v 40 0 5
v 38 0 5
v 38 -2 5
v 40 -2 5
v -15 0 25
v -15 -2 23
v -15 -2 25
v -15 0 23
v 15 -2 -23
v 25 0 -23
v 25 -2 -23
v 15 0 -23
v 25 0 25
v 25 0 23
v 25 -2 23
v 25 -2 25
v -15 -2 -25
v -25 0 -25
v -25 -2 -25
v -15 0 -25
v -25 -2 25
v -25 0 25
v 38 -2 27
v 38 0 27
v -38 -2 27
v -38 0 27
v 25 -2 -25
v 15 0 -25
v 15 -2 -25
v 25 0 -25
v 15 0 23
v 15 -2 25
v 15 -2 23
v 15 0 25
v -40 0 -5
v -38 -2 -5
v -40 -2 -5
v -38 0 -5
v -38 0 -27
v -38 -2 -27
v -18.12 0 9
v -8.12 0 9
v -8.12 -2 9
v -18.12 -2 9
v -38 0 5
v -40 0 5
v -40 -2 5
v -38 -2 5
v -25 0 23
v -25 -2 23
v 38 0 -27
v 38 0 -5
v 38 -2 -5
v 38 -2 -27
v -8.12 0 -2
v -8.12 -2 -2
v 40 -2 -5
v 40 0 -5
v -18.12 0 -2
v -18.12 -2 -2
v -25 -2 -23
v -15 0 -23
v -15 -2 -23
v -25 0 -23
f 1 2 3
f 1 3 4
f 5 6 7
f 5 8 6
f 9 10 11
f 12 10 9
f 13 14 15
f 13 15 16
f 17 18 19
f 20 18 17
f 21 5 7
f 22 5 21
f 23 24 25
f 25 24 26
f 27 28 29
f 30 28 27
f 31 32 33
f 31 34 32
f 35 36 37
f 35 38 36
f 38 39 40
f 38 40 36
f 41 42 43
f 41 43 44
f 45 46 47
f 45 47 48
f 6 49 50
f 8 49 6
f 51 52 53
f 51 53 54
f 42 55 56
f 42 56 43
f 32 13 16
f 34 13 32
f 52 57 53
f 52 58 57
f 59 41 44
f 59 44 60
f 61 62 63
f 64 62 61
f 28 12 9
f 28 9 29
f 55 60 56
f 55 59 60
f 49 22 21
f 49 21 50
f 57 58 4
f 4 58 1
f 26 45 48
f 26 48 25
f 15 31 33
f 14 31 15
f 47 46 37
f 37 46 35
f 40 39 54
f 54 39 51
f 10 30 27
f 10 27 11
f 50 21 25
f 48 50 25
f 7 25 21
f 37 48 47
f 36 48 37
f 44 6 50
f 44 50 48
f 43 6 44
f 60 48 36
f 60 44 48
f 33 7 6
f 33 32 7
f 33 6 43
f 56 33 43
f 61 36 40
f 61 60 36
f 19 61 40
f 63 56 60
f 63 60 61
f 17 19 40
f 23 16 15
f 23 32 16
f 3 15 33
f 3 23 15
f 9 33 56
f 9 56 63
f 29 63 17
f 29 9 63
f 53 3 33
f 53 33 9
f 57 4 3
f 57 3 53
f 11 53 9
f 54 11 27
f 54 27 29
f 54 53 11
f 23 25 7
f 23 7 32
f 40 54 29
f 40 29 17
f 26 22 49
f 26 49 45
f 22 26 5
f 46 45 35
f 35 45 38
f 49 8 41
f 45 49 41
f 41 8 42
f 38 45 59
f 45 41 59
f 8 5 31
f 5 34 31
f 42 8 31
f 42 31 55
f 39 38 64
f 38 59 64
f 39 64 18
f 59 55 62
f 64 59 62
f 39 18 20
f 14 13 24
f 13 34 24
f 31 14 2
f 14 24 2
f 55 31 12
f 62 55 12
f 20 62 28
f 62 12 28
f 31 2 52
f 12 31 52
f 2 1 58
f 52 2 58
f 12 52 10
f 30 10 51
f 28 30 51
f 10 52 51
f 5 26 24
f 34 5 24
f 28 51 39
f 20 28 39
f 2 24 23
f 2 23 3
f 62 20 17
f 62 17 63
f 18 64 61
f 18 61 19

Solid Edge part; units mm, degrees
sketch "Sketch1" plane through (0, 0, 0) normal (0, -1, 0) x (1, 0, 0)
  line L0 (40, -27) -> (40, 27)
  line L1 (40, 27) -> (-40, 27)
  line L2 (-40, 27) -> (-40, -27)
  line L3 (-40, -27) -> (40, -27)
extrude "Protrusion1" add sketch "Sketch1" along normal blind 2
sketch "Sketch2" plane through (0, 0, 0) normal (0, -1, 0) x (1, 0, 0)
  line L0 (-25, 23) -> (-15, 23)
  line L1 (-15, 23) -> (-15, 25)
  line L2 (-15, 25) -> (-25, 25)
  line L3 (-25, 25) -> (-25, 23)
extrude "ExtrudedCutout_1" cut sketch "Sketch2" along normal blind 2
sketch "Sketch3" plane through (0, 0, 0) normal (0, -1, 0) x (1, 0, 0)
  line L0 (25, 25) -> (15, 25)
  line L1 (15, 25) -> (15, 23)
  line L2 (15, 23) -> (25, 23)
  line L3 (25, 23) -> (25, 25)
extrude "ExtrudedCutout_2" cut sketch "Sketch3" along normal blind 2
sketch "Sketch4" plane through (0, 0, 0) normal (0, -1, 0) x (1, 0, 0)
  line L0 (15, -25) -> (25, -25)
  line L1 (25, -25) -> (25, -23)
  line L2 (25, -23) -> (15, -23)
  line L3 (15, -23) -> (15, -25)
extrude "ExtrudedCutout_3" cut sketch "Sketch4" along normal blind 2
sketch "Sketch5" plane through (0, 0, 0) normal (0, -1, 0) x (1, 0, 0)
  line L0 (-15, -23) -> (-25, -23)
  line L1 (-25, -23) -> (-25, -25)
  line L2 (-25, -25) -> (-15, -25)
  line L3 (-15, -25) -> (-15, -23)
extrude "ExtrudedCutout_4" cut sketch "Sketch5" along normal blind 2
sketch "Sketch6" plane through (0, 0, 0) normal (0, -1, 0) x (1, 0, 0)
  line L0 (-38, -27) -> (-38, -5)
  line L1 (-38, -5) -> (-40, -5)
  line L2 (-40, -5) -> (-40, -27)
  line L3 (-40, -27) -> (-38, -27)
extrude "ExtrudedCutout_5" cut sketch "Sketch6" along normal blind 2
sketch "Sketch7" plane through (0, 0, 0) normal (0, -1, 0) x (1, 0, 0)
  line L0 (-38, 5) -> (-38, 27)
  line L1 (-38, 27) -> (-40, 27)
  line L2 (-40, 27) -> (-40, 5)
  line L3 (-40, 5) -> (-38, 5)
extrude "ExtrudedCutout_6" cut sketch "Sketch7" along normal blind 2
sketch "Sketch8" plane through (0, 0, 0) normal (0, -1, 0) x (1, 0, 0)
  line L0 (38, -5) -> (38, -27)
  line L1 (38, -27) -> (40, -27)
  line L2 (40, -27) -> (40, -5)
  line L3 (40, -5) -> (38, -5)
extrude "ExtrudedCutout_7" cut sketch "Sketch8" along normal blind 2
sketch "Sketch9" plane through (0, 0, 0) normal (0, -1, 0) x (1, 0, 0)
  line L0 (38, 27) -> (38, 5)
  line L1 (38, 5) -> (40, 5)
  line L2 (40, 5) -> (40, 27)
  line L3 (40, 27) -> (38, 27)
extrude "ExtrudedCutout_8" cut sketch "Sketch9" along normal blind 2
sketch "Sketch10" plane through (0, 0, 0) normal (0, -1, 0) x (1, 0, 0)
  line L0 (-18.12, -2) -> (-8.12, -2)
  line L1 (-8.12, -2) -> (-8.12, 9)
  line L2 (-8.12, 9) -> (-18.12, 9)
  line L3 (-18.12, 9) -> (-18.12, -2)
extrude "ExtrudedCutout_9" cut sketch "Sketch10" along normal blind 2
properties material "Acrylic, high impact grade"
